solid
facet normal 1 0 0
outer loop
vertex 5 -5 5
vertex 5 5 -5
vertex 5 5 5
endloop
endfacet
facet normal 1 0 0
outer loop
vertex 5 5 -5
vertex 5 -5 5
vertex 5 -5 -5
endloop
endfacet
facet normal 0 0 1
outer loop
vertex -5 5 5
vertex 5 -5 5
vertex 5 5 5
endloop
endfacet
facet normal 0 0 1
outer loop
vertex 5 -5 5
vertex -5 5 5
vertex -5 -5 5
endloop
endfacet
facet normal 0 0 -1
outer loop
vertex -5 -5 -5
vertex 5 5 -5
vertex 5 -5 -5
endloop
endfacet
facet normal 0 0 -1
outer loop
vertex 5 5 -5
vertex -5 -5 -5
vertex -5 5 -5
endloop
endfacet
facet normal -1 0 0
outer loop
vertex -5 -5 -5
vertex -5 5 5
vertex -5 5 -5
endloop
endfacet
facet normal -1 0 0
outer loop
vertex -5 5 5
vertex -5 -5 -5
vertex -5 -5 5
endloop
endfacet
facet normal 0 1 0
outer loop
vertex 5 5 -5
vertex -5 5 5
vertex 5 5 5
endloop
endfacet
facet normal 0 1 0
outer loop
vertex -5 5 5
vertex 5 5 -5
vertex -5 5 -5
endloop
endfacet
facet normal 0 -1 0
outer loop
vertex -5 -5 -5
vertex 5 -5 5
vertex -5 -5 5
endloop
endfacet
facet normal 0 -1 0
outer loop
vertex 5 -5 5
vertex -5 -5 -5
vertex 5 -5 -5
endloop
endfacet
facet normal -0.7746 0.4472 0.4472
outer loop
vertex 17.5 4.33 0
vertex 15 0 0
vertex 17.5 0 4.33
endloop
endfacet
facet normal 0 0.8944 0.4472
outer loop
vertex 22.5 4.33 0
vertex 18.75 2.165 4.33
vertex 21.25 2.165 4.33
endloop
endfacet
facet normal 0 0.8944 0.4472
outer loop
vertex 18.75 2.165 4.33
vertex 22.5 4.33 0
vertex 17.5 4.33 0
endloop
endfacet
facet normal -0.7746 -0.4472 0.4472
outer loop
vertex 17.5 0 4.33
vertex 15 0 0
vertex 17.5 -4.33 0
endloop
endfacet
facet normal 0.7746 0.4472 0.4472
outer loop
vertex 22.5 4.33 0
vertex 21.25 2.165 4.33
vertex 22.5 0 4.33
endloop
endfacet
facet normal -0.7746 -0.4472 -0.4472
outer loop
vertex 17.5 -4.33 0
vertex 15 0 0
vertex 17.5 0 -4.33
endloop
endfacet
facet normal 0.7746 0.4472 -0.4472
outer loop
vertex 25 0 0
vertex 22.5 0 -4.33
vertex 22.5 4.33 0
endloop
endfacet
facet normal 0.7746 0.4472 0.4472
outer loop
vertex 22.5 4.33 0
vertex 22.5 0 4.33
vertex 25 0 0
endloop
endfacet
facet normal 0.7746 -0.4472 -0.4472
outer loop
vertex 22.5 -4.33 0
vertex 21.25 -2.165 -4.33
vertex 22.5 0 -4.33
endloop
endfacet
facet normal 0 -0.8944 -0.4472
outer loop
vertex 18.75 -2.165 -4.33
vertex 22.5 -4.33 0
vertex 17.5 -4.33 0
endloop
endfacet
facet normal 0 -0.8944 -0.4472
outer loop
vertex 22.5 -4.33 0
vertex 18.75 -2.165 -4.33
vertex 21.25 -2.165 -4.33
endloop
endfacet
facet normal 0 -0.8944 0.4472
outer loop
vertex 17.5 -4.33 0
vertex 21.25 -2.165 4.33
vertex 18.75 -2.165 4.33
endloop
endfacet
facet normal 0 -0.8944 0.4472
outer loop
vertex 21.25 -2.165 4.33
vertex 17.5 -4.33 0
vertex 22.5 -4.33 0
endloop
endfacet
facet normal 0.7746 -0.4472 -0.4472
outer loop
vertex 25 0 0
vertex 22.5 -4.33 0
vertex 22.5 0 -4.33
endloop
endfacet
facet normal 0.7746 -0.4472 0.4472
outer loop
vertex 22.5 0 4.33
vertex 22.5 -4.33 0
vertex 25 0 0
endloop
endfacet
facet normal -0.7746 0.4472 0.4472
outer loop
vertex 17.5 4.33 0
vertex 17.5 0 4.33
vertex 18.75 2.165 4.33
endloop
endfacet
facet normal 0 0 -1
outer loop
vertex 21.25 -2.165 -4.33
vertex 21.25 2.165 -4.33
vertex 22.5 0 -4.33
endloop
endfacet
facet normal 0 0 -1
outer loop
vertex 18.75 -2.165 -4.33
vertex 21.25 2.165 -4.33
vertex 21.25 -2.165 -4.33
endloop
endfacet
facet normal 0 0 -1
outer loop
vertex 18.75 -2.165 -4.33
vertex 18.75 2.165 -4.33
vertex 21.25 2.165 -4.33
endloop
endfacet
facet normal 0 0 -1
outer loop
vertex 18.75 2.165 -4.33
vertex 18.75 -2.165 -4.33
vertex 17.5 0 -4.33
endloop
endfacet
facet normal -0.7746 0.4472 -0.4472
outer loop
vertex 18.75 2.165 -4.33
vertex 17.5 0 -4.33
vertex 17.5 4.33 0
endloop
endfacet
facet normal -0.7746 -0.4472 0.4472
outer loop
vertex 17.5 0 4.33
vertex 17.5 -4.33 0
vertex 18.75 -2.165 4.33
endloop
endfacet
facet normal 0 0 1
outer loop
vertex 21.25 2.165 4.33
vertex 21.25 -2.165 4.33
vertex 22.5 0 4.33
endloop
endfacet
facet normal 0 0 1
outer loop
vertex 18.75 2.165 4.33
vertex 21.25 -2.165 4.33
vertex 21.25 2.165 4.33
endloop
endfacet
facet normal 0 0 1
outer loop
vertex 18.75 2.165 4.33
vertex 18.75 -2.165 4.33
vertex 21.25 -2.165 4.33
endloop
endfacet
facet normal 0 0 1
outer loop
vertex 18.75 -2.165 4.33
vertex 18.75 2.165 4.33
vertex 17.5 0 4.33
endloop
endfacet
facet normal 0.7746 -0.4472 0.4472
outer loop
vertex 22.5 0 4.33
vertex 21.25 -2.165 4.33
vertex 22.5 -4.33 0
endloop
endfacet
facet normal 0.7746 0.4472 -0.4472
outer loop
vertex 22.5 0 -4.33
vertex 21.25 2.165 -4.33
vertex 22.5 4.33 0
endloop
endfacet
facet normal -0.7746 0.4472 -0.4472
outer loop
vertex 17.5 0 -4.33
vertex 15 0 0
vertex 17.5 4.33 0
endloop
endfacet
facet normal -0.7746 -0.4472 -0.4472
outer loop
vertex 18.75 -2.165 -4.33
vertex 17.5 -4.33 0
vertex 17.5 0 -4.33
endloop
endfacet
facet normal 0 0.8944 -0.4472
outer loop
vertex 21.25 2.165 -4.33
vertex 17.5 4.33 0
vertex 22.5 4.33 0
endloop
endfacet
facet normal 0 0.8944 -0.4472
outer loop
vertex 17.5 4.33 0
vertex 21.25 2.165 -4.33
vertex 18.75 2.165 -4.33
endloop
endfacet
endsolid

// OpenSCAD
// Topology varies with $t: the sphere's facet count changes between frames, so the exported
// stage must time-sample faceVertexCounts/faceVertexIndices and not just points.
rotate([0, 0, $t * 90]) cube(10, center = true);
color("red") translate([20, 0, 0]) sphere(r = 5, $fn = 6 + floor($t * 4) * 2);
